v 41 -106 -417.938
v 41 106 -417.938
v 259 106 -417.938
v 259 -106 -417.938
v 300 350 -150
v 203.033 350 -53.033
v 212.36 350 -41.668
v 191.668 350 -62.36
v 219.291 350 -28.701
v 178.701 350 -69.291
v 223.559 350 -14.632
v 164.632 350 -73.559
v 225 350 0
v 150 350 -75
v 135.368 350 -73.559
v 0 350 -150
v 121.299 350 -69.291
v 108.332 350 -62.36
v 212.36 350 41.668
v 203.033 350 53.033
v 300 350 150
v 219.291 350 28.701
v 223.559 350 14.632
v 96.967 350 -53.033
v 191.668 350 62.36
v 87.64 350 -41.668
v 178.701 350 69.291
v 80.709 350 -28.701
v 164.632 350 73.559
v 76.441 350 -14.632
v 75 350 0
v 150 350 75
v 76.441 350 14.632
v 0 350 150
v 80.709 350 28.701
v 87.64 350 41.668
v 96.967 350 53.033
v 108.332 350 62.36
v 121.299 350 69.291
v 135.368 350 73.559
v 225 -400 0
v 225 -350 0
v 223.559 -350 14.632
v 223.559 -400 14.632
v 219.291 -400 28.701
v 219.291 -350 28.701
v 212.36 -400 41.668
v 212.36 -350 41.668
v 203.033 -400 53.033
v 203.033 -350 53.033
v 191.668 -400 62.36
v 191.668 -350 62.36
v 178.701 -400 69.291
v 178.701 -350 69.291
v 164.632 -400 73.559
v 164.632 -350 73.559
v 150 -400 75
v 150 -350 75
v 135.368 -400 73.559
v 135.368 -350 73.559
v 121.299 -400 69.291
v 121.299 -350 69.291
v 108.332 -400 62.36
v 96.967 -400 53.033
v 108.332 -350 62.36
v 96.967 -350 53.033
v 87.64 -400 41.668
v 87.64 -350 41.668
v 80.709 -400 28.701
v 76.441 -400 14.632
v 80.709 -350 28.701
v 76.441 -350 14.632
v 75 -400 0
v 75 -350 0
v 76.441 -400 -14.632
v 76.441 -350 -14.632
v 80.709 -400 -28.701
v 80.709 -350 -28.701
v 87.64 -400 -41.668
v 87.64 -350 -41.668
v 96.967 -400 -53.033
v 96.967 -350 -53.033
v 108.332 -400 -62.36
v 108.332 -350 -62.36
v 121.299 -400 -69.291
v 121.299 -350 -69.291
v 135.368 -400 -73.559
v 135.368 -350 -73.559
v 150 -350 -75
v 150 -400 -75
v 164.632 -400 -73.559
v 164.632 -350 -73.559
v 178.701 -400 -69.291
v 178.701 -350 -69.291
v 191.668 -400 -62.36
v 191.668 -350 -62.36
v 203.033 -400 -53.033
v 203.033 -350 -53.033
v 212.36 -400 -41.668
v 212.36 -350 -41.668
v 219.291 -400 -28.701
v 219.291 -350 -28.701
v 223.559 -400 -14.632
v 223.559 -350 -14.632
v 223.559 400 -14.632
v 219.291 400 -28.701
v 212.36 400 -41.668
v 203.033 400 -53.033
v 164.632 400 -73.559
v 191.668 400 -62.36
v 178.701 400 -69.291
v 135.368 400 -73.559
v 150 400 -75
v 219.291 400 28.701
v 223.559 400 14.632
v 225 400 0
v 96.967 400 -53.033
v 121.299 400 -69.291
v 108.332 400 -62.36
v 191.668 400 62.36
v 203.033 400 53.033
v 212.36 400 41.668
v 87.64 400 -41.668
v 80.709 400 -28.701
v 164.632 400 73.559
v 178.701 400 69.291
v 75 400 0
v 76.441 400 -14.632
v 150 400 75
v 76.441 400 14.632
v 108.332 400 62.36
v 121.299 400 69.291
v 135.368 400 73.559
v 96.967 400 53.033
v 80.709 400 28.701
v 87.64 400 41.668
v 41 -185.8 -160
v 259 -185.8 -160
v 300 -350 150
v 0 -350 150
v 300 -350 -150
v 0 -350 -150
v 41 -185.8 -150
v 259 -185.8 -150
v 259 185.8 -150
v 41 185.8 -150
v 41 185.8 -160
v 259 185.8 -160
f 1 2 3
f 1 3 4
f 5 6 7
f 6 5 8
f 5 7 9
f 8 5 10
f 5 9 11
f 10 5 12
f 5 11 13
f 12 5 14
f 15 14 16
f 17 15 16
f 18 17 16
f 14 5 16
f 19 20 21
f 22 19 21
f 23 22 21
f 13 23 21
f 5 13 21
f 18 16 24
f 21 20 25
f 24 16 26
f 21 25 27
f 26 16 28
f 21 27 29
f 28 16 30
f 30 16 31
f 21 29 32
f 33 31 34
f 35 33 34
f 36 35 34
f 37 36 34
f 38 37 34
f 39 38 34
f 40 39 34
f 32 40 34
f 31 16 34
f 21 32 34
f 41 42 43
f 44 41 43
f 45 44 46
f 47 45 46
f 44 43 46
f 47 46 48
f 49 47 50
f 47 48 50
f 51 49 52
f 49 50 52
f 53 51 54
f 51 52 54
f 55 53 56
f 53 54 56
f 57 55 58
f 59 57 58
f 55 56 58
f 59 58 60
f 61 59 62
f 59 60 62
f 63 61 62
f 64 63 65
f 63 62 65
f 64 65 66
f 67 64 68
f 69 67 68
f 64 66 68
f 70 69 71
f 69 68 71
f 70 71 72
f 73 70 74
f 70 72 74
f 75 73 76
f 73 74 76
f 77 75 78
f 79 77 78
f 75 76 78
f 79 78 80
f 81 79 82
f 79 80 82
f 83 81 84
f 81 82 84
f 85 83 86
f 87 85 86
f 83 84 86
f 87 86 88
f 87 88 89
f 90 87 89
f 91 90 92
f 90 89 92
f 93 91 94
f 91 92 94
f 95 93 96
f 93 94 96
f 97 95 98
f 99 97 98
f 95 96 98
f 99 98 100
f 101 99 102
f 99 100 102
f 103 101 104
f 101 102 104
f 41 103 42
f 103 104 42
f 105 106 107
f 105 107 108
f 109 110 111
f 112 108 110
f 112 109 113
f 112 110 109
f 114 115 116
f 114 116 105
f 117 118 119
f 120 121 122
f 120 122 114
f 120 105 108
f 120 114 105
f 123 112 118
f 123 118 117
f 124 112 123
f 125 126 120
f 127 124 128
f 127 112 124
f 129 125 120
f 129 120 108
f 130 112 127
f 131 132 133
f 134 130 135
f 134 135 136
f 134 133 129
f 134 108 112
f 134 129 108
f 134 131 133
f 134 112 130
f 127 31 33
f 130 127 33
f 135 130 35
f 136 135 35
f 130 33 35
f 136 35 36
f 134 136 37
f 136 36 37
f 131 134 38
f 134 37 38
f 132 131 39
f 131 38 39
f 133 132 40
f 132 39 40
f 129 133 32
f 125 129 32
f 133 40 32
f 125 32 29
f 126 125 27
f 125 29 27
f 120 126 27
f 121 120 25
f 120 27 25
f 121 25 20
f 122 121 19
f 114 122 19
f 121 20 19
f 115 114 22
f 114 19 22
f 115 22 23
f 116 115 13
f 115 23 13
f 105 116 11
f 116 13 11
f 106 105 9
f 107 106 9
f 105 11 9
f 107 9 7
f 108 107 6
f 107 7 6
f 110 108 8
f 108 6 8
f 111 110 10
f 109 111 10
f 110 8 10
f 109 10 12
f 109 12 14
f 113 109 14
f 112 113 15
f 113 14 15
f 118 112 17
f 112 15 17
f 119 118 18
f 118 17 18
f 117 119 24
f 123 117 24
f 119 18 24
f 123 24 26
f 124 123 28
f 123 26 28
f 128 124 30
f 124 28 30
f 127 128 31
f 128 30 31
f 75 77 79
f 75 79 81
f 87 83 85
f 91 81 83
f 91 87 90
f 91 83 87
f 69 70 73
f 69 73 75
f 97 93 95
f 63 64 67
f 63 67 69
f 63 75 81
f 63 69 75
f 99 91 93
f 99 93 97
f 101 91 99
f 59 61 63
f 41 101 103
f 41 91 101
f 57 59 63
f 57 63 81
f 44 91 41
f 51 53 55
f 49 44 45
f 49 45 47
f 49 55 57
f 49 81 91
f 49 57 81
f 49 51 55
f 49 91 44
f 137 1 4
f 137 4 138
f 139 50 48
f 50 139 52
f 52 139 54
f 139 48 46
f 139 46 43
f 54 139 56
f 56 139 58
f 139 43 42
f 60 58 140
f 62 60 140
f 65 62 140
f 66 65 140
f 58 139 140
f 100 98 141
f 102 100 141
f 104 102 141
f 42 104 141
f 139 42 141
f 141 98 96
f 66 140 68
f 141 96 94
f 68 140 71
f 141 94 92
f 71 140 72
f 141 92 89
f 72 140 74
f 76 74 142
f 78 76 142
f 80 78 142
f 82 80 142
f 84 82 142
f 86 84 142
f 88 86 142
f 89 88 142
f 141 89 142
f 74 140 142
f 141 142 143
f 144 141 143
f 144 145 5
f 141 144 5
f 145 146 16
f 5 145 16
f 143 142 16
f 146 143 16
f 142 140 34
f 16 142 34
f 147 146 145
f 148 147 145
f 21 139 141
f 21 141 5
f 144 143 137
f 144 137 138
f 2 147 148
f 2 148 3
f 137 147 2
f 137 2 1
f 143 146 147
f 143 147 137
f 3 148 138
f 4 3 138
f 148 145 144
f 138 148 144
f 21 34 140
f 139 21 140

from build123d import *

# Parameters (mm, degrees)
F1_DEPTH = 300
F2_R     = 75
F3_DEPTH = 50
F4_W     = 218
F4_H     = 371.600151062
F5_DEPTH = 10
F7_DEPTH = 218
F8_R     = 75
F9_DEPTH = 50


with BuildPart() as f1:
    # F0 (on Right) → F1 (new body)
    with BuildSketch(Plane.YZ):
        Polygon((350, 75), (350, 150), (-350, 150), (-350, -150), (350, -150), (350, 0), align=None)
    extrude(amount=F1_DEPTH)

    # F2 (on face) → F3 (join)
    with BuildSketch(Plane(origin=(0, 350, 0), x_dir=(-1, 0, 0), z_dir=(0, 1, 0))):
        with Locations((-150, 0)):
            Circle(F2_R)
    extrude(amount=F3_DEPTH)

    # F4 (on face) → F5 (join)
    with BuildSketch(Plane(origin=(0, 0, -150), x_dir=(1, 0, 0), z_dir=(0, 0, -1))):
        with Locations((150, 0)):
            Rectangle(F4_W, F4_H)
    extrude(amount=F5_DEPTH)

    # F6 (on face) → F7 (join)
    with BuildSketch(Plane(origin=(41, 0, 0), x_dir=(0, -1, 0), z_dir=(-1, 0, 0))):
        Polygon((185.800075531, -160), (-185.800075531, -160), (-106, -417.9378761354), (106, -417.9378761354), align=None)
    extrude(amount=-F7_DEPTH)

    # F8 (on face) → F9 (join)
    with BuildSketch(Plane.XZ.offset(350)):
        with Locations((150, 0)):
            Circle(F8_R)
    extrude(amount=F9_DEPTH)


solid = f1.part
